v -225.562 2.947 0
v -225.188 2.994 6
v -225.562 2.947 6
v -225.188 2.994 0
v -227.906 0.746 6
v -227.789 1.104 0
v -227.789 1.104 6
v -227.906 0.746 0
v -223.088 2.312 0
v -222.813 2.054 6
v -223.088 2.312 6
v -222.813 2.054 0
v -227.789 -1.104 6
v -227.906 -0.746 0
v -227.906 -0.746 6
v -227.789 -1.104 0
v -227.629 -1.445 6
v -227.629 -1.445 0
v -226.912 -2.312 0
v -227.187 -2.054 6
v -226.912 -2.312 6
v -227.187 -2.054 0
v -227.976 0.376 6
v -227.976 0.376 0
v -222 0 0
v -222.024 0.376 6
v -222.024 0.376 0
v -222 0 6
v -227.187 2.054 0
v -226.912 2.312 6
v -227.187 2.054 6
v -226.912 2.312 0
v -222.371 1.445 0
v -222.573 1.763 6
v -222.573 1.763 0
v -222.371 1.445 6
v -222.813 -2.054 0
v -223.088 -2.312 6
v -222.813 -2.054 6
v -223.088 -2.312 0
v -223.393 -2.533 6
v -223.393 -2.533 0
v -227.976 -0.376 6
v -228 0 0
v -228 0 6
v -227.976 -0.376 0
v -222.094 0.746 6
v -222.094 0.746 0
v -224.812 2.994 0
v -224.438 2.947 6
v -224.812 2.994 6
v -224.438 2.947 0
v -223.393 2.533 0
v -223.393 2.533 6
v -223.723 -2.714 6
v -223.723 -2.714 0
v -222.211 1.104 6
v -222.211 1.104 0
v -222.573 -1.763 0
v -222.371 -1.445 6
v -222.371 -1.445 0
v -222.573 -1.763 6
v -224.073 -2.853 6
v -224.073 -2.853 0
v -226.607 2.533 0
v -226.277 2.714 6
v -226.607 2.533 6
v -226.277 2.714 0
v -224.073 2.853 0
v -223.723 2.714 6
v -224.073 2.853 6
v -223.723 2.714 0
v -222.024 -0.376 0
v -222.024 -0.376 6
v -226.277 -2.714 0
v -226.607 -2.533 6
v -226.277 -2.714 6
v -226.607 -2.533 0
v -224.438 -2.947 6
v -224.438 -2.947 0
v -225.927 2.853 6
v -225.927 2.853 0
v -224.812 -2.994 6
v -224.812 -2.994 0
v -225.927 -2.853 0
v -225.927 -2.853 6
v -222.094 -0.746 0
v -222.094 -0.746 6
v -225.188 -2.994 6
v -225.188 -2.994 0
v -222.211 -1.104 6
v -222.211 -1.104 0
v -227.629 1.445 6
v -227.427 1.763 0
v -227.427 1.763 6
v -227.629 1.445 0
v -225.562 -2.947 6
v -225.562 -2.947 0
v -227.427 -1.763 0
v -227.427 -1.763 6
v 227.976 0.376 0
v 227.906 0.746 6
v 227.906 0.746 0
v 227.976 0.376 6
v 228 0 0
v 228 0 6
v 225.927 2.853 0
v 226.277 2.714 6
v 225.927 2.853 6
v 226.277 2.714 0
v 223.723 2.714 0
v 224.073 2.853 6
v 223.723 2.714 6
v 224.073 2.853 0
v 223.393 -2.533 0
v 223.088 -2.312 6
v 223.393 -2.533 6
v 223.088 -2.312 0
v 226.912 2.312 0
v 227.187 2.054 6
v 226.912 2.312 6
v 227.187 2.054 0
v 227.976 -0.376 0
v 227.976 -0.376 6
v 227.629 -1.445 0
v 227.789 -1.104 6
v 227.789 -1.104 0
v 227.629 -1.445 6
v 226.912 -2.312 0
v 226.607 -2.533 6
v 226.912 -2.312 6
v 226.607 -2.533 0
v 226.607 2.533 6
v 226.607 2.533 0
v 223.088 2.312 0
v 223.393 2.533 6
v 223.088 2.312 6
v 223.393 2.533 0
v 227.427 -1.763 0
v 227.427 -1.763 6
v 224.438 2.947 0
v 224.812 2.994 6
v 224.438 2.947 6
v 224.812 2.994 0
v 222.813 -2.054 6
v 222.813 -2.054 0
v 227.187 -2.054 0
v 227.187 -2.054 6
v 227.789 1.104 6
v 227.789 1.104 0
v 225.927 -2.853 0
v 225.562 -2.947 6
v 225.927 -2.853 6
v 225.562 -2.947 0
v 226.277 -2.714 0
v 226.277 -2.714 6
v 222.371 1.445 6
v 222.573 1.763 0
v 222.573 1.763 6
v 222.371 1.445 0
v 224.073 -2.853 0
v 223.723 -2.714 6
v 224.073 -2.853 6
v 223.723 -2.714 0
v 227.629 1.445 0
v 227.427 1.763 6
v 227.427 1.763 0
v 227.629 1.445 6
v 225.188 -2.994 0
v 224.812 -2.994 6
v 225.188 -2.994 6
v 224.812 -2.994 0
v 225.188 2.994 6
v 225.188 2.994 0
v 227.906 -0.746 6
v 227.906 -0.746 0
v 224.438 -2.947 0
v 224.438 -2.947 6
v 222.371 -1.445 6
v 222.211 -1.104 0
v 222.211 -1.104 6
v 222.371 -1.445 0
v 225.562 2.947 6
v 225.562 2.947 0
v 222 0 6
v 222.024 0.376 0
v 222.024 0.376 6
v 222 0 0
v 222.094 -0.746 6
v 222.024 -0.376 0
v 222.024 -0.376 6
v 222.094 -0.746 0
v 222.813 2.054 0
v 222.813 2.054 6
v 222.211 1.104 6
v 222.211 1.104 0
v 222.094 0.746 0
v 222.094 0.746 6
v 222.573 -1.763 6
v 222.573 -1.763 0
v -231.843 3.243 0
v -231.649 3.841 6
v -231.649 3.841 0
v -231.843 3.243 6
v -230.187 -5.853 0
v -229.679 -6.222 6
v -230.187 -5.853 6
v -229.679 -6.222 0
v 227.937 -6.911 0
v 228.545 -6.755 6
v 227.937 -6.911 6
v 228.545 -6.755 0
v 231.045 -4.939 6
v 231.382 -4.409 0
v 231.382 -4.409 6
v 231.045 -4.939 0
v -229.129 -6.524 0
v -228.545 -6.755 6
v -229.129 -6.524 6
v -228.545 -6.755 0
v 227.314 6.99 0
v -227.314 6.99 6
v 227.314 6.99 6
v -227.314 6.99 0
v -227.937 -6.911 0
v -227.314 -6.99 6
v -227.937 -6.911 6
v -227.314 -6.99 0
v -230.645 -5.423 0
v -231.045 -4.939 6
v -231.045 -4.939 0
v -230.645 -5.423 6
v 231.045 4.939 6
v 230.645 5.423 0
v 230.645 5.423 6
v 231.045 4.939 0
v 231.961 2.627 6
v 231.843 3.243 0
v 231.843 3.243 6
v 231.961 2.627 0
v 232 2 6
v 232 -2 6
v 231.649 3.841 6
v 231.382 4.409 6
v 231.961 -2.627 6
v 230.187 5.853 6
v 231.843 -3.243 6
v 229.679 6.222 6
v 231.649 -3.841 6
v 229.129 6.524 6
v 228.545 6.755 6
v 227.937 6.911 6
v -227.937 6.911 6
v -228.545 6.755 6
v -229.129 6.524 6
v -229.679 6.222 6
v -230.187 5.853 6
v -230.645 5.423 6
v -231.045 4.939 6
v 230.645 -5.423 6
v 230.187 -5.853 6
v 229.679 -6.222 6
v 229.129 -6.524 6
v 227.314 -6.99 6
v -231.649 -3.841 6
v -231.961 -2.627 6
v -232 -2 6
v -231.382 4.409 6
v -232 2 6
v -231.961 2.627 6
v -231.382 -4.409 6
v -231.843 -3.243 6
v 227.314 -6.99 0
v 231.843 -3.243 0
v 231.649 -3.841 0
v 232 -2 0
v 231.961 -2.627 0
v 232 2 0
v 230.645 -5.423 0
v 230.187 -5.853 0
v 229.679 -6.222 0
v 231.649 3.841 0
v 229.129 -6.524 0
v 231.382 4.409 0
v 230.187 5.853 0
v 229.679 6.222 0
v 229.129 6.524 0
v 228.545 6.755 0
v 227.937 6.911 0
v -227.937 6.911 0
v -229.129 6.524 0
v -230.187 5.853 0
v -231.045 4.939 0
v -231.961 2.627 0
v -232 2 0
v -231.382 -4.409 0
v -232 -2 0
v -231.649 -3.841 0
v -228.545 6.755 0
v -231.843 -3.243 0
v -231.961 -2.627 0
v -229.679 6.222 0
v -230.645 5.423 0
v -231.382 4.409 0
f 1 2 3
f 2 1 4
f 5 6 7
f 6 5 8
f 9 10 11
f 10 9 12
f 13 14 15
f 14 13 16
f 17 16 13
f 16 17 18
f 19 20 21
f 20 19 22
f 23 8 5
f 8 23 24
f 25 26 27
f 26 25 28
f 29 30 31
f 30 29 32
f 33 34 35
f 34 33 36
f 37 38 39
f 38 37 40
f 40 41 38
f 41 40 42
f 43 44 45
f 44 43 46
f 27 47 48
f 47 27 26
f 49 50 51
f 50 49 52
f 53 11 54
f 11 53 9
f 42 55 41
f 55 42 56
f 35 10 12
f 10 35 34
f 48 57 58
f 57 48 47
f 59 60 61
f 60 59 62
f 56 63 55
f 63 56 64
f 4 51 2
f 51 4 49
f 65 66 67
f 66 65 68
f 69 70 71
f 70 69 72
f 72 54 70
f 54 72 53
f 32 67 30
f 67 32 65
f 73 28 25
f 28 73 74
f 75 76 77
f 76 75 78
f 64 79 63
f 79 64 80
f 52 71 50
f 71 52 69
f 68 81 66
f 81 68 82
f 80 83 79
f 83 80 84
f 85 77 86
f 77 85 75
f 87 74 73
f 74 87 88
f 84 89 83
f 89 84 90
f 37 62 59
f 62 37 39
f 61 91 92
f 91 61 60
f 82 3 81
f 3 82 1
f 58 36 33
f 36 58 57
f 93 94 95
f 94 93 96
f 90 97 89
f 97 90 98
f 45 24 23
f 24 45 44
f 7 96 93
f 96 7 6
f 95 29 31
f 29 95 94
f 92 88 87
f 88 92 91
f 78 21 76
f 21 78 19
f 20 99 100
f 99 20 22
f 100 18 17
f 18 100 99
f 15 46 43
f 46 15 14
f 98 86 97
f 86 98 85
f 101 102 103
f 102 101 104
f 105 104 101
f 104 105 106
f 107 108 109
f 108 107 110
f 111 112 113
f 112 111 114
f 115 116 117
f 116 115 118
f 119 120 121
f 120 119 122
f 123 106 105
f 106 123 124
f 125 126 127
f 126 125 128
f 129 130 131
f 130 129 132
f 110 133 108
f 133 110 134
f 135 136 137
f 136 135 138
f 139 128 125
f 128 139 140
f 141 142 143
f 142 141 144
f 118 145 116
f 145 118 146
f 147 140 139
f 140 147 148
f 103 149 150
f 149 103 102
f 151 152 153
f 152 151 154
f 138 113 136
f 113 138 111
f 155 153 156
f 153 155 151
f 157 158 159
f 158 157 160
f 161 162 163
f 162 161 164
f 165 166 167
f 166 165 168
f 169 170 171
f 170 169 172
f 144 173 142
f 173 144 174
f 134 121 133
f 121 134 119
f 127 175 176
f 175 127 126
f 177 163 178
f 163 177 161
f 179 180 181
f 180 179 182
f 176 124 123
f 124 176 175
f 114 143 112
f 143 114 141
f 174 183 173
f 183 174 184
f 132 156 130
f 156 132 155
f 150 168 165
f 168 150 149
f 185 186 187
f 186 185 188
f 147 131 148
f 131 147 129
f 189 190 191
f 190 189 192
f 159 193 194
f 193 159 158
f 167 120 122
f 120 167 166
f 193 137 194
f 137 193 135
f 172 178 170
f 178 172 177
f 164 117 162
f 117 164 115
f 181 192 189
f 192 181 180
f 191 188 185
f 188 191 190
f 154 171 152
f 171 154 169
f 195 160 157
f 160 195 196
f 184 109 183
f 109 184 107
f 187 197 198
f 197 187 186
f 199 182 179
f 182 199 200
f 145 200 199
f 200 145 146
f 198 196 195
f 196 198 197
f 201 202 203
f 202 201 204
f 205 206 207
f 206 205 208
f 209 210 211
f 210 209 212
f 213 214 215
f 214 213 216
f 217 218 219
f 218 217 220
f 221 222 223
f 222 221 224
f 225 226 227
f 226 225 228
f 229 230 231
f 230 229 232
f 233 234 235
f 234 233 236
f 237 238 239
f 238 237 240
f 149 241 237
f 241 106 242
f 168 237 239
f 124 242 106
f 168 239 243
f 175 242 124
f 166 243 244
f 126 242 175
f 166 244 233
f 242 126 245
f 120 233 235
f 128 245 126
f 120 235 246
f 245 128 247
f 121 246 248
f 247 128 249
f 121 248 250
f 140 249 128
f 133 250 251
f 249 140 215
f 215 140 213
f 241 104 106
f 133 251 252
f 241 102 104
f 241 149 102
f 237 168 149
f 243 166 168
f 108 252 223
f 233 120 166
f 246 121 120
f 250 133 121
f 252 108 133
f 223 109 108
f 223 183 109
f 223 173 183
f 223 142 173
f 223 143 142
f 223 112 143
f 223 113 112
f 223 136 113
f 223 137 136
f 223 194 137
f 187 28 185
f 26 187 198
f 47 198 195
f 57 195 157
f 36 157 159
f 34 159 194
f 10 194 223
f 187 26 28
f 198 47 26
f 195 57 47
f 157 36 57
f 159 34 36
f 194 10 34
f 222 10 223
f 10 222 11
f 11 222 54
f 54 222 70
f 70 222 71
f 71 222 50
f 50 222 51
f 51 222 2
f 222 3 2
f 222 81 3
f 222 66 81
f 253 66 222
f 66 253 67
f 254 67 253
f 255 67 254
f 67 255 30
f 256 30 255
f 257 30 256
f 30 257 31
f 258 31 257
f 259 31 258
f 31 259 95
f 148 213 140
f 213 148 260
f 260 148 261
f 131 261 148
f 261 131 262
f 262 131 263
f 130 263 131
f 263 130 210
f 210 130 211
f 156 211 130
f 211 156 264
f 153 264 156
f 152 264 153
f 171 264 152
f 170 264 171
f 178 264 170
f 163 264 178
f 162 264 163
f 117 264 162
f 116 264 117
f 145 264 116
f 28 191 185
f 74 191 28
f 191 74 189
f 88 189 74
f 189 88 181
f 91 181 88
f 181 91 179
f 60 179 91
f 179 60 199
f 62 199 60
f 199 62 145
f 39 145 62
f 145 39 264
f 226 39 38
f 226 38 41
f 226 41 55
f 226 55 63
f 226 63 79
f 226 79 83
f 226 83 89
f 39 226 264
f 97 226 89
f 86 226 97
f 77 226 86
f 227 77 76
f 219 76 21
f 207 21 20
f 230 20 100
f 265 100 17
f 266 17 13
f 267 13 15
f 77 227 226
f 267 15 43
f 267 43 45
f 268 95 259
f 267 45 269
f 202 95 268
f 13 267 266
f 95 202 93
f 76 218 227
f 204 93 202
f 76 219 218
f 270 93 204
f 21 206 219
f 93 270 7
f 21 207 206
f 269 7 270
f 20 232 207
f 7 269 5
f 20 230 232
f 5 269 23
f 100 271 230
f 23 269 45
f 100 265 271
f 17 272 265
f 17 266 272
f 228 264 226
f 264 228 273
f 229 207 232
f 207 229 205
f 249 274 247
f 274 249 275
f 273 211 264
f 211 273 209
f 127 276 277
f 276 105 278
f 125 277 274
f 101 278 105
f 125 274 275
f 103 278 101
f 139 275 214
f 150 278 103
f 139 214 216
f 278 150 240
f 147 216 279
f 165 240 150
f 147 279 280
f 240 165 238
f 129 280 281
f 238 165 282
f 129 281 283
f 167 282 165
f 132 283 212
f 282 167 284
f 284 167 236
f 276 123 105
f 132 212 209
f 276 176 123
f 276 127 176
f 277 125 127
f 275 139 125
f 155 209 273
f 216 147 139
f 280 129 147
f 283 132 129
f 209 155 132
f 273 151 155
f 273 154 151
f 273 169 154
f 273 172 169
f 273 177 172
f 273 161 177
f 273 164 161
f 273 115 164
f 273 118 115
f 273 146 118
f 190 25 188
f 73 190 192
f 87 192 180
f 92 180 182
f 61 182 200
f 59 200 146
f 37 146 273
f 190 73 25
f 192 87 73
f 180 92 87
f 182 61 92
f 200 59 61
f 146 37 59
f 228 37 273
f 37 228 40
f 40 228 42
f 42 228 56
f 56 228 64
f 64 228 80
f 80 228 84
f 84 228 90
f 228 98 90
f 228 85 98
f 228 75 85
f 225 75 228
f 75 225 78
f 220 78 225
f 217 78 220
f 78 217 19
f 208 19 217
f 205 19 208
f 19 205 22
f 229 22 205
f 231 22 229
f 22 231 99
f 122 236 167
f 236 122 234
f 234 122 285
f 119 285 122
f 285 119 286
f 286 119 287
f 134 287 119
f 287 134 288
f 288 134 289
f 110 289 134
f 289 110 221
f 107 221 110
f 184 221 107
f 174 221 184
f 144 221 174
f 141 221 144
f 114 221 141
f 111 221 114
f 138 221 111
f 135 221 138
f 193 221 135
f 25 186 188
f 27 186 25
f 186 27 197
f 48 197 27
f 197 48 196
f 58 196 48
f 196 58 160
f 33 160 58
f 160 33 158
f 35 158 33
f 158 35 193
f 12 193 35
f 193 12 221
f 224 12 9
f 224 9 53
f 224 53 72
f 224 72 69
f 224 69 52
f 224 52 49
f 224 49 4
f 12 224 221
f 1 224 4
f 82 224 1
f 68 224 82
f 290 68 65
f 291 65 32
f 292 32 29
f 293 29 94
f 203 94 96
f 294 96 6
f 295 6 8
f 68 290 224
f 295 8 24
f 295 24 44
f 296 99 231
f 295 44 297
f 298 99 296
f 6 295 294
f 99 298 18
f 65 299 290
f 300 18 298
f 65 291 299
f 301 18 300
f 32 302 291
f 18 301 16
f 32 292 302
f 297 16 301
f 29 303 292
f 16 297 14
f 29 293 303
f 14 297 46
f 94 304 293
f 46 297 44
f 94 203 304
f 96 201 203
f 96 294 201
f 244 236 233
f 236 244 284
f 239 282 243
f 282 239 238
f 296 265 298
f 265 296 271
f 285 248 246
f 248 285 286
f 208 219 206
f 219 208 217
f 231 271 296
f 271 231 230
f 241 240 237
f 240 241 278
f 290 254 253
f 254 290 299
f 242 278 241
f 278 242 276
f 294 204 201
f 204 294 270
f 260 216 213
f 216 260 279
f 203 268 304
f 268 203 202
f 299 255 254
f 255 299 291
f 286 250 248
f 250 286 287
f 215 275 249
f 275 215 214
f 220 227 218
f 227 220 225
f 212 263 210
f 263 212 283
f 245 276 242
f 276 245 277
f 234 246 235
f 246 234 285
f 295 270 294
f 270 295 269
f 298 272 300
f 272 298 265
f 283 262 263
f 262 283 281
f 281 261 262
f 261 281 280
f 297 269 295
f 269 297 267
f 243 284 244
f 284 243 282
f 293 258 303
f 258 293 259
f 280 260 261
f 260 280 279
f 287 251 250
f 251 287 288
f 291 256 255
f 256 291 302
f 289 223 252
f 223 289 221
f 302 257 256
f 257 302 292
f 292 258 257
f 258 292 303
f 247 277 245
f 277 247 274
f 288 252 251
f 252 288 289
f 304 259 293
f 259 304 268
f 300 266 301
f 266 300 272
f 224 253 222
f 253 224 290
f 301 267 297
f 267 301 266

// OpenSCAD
$fn = 50;


difference() {
	union() {
		hull() {
			translate(v = [-227.0000000000, 2.0000000000, 0]) {
				cylinder(h = 6, r = 5);
			}
			translate(v = [227.0000000000, 2.0000000000, 0]) {
				cylinder(h = 6, r = 5);
			}
			translate(v = [-227.0000000000, -2.0000000000, 0]) {
				cylinder(h = 6, r = 5);
			}
			translate(v = [227.0000000000, -2.0000000000, 0]) {
				cylinder(h = 6, r = 5);
			}
		}
	}
	union() {
		translate(v = [-225.0000000000, 0.0000000000, -100.0000000000]) {
			cylinder(h = 200, r = 3.0000000000);
		}
		translate(v = [-225.0000000000, 0.0000000000, -100.0000000000]) {
			cylinder(h = 200, r = 3.0000000000);
		}
		translate(v = [225.0000000000, 0.0000000000, -100.0000000000]) {
			cylinder(h = 200, r = 3.0000000000);
		}
		translate(v = [225.0000000000, 0.0000000000, -100.0000000000]) {
			cylinder(h = 200, r = 3.0000000000);
		}
	}
}
